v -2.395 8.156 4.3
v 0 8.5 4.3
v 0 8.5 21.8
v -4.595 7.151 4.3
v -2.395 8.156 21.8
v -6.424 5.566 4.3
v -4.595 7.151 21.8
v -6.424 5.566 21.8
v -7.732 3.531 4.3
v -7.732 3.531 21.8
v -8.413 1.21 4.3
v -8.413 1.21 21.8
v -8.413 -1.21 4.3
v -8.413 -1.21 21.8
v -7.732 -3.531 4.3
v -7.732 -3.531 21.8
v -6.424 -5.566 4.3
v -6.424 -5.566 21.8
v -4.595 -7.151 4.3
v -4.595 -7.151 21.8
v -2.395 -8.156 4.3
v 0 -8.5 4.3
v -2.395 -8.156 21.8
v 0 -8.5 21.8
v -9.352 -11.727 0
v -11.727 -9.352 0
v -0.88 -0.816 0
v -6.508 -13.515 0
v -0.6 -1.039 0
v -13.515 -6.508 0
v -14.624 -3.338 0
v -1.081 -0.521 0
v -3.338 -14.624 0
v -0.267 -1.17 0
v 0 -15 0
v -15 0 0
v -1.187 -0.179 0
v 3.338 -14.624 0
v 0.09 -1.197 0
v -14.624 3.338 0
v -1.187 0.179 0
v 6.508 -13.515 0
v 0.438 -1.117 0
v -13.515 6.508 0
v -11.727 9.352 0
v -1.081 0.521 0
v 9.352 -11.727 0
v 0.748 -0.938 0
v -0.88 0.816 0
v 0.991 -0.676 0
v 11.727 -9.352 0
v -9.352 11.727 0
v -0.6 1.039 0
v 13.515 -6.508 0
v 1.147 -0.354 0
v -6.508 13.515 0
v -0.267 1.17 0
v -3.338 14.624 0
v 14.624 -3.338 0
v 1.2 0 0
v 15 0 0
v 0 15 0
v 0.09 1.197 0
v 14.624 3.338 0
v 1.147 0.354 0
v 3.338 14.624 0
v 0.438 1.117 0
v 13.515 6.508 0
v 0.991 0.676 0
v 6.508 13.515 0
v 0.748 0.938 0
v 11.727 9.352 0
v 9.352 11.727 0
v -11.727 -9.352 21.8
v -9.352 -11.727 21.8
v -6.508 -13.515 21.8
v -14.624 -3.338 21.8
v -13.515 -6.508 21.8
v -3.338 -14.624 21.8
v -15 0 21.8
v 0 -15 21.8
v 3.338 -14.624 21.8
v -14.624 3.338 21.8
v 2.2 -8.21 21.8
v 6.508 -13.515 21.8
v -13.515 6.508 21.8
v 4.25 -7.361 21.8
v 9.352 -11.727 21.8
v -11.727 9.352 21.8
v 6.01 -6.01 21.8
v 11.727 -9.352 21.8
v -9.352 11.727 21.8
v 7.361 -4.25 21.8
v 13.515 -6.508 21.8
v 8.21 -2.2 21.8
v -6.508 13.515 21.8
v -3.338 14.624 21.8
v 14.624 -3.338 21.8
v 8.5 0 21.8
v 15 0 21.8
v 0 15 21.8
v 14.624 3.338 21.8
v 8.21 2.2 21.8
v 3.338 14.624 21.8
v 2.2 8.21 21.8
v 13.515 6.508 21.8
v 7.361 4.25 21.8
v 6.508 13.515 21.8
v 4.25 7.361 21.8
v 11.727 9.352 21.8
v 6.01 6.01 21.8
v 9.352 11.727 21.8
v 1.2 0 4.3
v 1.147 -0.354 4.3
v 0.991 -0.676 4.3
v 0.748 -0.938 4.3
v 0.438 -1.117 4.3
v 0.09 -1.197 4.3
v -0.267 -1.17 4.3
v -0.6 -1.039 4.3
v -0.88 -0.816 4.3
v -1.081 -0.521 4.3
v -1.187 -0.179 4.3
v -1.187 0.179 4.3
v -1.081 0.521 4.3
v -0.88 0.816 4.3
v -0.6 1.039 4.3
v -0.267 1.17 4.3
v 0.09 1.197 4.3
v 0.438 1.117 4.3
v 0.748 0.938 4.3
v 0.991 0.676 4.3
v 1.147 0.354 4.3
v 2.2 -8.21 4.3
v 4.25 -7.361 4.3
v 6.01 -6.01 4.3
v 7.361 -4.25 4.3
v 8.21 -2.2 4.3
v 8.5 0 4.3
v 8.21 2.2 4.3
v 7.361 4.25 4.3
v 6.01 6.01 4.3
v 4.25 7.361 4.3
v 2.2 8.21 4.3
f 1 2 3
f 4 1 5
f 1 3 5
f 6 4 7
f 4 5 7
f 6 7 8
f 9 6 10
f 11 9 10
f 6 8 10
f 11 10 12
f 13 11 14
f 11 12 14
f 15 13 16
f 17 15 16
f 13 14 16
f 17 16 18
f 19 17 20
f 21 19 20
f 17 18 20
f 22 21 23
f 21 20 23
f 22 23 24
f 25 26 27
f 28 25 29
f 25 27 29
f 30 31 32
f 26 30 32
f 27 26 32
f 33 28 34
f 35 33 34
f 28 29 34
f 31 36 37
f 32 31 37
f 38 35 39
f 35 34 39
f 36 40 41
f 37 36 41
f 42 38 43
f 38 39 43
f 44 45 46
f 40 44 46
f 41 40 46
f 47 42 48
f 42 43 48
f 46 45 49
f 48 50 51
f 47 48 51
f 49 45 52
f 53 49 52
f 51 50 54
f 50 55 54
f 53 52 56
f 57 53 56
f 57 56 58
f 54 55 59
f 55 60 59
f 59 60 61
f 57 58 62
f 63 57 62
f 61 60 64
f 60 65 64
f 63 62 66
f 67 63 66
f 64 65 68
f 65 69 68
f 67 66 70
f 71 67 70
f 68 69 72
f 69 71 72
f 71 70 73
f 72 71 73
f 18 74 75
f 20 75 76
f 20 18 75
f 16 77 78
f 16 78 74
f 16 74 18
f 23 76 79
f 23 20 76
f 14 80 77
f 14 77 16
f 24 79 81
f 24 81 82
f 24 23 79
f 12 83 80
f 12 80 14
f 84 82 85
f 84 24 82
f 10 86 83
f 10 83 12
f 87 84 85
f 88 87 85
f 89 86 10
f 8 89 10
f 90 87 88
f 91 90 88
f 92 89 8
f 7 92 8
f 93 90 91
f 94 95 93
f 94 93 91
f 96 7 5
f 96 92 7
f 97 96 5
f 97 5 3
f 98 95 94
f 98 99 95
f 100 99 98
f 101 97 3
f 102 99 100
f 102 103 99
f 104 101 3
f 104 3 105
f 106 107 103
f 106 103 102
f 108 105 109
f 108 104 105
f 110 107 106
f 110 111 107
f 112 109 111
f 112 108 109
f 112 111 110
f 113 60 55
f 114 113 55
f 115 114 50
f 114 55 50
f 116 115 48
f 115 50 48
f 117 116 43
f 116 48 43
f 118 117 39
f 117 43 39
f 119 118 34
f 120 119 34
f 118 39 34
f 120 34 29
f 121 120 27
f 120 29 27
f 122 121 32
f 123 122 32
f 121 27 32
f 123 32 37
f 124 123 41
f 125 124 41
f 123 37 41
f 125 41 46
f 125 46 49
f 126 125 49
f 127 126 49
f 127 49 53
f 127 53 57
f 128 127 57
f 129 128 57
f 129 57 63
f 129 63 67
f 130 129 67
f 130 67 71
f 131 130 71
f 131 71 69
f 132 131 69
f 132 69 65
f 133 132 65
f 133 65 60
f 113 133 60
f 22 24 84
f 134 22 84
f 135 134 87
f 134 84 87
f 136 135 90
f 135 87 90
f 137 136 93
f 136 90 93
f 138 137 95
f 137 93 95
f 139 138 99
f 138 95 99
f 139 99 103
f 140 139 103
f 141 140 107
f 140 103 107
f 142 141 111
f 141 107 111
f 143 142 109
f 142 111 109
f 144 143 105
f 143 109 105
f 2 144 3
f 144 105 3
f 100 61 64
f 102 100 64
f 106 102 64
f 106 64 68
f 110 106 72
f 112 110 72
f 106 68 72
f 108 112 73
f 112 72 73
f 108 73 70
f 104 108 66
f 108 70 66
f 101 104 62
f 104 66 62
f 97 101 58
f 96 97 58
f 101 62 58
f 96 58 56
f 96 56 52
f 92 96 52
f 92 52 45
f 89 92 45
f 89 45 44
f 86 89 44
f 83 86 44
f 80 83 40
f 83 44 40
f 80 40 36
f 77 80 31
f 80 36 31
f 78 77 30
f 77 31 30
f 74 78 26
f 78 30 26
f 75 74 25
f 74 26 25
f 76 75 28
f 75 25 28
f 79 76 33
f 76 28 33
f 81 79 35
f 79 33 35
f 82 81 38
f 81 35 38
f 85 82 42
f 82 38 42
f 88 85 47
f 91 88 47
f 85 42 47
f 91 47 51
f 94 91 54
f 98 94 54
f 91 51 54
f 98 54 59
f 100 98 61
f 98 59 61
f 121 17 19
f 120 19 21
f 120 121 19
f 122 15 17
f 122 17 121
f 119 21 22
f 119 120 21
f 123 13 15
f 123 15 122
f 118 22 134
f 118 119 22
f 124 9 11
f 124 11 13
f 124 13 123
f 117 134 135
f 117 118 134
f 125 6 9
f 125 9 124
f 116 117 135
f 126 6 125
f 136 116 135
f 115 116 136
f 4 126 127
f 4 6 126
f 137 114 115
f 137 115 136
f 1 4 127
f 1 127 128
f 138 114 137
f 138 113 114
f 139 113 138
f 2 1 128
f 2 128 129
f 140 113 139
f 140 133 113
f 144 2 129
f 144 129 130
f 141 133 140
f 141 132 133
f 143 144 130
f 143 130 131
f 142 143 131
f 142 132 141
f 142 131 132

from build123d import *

# Parameters (mm, degrees)
F0_R     = 15
F1_DEPTH = 21.8
F3_DEPTH = 17.5
F4_R     = 1.2
F5_DEPTH = 25.4


with BuildPart() as f1:
    # F0 (on Top) → F1 (new body)
    with BuildSketch(Plane.XY):
        Circle(F0_R)
    extrude(amount=F1_DEPTH)

    # F2 (on face) → F3 (cut)
    with BuildSketch(Plane.XY.offset(21.8)):
        with BuildLine():
            Line((0, -8.5), (0, 8.5))
            ThreePointArc((0, 8.5), (-8.5, 0), (0, -8.5))
        make_face()
        with BuildLine():
            ThreePointArc((8.5, 0), (6.010408, 6.010408), (0, 8.5))
            Line((0, 8.5), (0, -8.5))
            ThreePointArc((0, -8.5), (6.010408, -6.010408), (8.5, 0))
        make_face()
    extrude(amount=-F3_DEPTH, mode=Mode.SUBTRACT)

    # F4 (on face) → F5 (cut)
    with BuildSketch(Plane(origin=(0, 0, 0), x_dir=(1, 0, 0), z_dir=(0, 0, -1))):
        Circle(F4_R)
    extrude(amount=-F5_DEPTH, mode=Mode.SUBTRACT)


solid = f1.part
